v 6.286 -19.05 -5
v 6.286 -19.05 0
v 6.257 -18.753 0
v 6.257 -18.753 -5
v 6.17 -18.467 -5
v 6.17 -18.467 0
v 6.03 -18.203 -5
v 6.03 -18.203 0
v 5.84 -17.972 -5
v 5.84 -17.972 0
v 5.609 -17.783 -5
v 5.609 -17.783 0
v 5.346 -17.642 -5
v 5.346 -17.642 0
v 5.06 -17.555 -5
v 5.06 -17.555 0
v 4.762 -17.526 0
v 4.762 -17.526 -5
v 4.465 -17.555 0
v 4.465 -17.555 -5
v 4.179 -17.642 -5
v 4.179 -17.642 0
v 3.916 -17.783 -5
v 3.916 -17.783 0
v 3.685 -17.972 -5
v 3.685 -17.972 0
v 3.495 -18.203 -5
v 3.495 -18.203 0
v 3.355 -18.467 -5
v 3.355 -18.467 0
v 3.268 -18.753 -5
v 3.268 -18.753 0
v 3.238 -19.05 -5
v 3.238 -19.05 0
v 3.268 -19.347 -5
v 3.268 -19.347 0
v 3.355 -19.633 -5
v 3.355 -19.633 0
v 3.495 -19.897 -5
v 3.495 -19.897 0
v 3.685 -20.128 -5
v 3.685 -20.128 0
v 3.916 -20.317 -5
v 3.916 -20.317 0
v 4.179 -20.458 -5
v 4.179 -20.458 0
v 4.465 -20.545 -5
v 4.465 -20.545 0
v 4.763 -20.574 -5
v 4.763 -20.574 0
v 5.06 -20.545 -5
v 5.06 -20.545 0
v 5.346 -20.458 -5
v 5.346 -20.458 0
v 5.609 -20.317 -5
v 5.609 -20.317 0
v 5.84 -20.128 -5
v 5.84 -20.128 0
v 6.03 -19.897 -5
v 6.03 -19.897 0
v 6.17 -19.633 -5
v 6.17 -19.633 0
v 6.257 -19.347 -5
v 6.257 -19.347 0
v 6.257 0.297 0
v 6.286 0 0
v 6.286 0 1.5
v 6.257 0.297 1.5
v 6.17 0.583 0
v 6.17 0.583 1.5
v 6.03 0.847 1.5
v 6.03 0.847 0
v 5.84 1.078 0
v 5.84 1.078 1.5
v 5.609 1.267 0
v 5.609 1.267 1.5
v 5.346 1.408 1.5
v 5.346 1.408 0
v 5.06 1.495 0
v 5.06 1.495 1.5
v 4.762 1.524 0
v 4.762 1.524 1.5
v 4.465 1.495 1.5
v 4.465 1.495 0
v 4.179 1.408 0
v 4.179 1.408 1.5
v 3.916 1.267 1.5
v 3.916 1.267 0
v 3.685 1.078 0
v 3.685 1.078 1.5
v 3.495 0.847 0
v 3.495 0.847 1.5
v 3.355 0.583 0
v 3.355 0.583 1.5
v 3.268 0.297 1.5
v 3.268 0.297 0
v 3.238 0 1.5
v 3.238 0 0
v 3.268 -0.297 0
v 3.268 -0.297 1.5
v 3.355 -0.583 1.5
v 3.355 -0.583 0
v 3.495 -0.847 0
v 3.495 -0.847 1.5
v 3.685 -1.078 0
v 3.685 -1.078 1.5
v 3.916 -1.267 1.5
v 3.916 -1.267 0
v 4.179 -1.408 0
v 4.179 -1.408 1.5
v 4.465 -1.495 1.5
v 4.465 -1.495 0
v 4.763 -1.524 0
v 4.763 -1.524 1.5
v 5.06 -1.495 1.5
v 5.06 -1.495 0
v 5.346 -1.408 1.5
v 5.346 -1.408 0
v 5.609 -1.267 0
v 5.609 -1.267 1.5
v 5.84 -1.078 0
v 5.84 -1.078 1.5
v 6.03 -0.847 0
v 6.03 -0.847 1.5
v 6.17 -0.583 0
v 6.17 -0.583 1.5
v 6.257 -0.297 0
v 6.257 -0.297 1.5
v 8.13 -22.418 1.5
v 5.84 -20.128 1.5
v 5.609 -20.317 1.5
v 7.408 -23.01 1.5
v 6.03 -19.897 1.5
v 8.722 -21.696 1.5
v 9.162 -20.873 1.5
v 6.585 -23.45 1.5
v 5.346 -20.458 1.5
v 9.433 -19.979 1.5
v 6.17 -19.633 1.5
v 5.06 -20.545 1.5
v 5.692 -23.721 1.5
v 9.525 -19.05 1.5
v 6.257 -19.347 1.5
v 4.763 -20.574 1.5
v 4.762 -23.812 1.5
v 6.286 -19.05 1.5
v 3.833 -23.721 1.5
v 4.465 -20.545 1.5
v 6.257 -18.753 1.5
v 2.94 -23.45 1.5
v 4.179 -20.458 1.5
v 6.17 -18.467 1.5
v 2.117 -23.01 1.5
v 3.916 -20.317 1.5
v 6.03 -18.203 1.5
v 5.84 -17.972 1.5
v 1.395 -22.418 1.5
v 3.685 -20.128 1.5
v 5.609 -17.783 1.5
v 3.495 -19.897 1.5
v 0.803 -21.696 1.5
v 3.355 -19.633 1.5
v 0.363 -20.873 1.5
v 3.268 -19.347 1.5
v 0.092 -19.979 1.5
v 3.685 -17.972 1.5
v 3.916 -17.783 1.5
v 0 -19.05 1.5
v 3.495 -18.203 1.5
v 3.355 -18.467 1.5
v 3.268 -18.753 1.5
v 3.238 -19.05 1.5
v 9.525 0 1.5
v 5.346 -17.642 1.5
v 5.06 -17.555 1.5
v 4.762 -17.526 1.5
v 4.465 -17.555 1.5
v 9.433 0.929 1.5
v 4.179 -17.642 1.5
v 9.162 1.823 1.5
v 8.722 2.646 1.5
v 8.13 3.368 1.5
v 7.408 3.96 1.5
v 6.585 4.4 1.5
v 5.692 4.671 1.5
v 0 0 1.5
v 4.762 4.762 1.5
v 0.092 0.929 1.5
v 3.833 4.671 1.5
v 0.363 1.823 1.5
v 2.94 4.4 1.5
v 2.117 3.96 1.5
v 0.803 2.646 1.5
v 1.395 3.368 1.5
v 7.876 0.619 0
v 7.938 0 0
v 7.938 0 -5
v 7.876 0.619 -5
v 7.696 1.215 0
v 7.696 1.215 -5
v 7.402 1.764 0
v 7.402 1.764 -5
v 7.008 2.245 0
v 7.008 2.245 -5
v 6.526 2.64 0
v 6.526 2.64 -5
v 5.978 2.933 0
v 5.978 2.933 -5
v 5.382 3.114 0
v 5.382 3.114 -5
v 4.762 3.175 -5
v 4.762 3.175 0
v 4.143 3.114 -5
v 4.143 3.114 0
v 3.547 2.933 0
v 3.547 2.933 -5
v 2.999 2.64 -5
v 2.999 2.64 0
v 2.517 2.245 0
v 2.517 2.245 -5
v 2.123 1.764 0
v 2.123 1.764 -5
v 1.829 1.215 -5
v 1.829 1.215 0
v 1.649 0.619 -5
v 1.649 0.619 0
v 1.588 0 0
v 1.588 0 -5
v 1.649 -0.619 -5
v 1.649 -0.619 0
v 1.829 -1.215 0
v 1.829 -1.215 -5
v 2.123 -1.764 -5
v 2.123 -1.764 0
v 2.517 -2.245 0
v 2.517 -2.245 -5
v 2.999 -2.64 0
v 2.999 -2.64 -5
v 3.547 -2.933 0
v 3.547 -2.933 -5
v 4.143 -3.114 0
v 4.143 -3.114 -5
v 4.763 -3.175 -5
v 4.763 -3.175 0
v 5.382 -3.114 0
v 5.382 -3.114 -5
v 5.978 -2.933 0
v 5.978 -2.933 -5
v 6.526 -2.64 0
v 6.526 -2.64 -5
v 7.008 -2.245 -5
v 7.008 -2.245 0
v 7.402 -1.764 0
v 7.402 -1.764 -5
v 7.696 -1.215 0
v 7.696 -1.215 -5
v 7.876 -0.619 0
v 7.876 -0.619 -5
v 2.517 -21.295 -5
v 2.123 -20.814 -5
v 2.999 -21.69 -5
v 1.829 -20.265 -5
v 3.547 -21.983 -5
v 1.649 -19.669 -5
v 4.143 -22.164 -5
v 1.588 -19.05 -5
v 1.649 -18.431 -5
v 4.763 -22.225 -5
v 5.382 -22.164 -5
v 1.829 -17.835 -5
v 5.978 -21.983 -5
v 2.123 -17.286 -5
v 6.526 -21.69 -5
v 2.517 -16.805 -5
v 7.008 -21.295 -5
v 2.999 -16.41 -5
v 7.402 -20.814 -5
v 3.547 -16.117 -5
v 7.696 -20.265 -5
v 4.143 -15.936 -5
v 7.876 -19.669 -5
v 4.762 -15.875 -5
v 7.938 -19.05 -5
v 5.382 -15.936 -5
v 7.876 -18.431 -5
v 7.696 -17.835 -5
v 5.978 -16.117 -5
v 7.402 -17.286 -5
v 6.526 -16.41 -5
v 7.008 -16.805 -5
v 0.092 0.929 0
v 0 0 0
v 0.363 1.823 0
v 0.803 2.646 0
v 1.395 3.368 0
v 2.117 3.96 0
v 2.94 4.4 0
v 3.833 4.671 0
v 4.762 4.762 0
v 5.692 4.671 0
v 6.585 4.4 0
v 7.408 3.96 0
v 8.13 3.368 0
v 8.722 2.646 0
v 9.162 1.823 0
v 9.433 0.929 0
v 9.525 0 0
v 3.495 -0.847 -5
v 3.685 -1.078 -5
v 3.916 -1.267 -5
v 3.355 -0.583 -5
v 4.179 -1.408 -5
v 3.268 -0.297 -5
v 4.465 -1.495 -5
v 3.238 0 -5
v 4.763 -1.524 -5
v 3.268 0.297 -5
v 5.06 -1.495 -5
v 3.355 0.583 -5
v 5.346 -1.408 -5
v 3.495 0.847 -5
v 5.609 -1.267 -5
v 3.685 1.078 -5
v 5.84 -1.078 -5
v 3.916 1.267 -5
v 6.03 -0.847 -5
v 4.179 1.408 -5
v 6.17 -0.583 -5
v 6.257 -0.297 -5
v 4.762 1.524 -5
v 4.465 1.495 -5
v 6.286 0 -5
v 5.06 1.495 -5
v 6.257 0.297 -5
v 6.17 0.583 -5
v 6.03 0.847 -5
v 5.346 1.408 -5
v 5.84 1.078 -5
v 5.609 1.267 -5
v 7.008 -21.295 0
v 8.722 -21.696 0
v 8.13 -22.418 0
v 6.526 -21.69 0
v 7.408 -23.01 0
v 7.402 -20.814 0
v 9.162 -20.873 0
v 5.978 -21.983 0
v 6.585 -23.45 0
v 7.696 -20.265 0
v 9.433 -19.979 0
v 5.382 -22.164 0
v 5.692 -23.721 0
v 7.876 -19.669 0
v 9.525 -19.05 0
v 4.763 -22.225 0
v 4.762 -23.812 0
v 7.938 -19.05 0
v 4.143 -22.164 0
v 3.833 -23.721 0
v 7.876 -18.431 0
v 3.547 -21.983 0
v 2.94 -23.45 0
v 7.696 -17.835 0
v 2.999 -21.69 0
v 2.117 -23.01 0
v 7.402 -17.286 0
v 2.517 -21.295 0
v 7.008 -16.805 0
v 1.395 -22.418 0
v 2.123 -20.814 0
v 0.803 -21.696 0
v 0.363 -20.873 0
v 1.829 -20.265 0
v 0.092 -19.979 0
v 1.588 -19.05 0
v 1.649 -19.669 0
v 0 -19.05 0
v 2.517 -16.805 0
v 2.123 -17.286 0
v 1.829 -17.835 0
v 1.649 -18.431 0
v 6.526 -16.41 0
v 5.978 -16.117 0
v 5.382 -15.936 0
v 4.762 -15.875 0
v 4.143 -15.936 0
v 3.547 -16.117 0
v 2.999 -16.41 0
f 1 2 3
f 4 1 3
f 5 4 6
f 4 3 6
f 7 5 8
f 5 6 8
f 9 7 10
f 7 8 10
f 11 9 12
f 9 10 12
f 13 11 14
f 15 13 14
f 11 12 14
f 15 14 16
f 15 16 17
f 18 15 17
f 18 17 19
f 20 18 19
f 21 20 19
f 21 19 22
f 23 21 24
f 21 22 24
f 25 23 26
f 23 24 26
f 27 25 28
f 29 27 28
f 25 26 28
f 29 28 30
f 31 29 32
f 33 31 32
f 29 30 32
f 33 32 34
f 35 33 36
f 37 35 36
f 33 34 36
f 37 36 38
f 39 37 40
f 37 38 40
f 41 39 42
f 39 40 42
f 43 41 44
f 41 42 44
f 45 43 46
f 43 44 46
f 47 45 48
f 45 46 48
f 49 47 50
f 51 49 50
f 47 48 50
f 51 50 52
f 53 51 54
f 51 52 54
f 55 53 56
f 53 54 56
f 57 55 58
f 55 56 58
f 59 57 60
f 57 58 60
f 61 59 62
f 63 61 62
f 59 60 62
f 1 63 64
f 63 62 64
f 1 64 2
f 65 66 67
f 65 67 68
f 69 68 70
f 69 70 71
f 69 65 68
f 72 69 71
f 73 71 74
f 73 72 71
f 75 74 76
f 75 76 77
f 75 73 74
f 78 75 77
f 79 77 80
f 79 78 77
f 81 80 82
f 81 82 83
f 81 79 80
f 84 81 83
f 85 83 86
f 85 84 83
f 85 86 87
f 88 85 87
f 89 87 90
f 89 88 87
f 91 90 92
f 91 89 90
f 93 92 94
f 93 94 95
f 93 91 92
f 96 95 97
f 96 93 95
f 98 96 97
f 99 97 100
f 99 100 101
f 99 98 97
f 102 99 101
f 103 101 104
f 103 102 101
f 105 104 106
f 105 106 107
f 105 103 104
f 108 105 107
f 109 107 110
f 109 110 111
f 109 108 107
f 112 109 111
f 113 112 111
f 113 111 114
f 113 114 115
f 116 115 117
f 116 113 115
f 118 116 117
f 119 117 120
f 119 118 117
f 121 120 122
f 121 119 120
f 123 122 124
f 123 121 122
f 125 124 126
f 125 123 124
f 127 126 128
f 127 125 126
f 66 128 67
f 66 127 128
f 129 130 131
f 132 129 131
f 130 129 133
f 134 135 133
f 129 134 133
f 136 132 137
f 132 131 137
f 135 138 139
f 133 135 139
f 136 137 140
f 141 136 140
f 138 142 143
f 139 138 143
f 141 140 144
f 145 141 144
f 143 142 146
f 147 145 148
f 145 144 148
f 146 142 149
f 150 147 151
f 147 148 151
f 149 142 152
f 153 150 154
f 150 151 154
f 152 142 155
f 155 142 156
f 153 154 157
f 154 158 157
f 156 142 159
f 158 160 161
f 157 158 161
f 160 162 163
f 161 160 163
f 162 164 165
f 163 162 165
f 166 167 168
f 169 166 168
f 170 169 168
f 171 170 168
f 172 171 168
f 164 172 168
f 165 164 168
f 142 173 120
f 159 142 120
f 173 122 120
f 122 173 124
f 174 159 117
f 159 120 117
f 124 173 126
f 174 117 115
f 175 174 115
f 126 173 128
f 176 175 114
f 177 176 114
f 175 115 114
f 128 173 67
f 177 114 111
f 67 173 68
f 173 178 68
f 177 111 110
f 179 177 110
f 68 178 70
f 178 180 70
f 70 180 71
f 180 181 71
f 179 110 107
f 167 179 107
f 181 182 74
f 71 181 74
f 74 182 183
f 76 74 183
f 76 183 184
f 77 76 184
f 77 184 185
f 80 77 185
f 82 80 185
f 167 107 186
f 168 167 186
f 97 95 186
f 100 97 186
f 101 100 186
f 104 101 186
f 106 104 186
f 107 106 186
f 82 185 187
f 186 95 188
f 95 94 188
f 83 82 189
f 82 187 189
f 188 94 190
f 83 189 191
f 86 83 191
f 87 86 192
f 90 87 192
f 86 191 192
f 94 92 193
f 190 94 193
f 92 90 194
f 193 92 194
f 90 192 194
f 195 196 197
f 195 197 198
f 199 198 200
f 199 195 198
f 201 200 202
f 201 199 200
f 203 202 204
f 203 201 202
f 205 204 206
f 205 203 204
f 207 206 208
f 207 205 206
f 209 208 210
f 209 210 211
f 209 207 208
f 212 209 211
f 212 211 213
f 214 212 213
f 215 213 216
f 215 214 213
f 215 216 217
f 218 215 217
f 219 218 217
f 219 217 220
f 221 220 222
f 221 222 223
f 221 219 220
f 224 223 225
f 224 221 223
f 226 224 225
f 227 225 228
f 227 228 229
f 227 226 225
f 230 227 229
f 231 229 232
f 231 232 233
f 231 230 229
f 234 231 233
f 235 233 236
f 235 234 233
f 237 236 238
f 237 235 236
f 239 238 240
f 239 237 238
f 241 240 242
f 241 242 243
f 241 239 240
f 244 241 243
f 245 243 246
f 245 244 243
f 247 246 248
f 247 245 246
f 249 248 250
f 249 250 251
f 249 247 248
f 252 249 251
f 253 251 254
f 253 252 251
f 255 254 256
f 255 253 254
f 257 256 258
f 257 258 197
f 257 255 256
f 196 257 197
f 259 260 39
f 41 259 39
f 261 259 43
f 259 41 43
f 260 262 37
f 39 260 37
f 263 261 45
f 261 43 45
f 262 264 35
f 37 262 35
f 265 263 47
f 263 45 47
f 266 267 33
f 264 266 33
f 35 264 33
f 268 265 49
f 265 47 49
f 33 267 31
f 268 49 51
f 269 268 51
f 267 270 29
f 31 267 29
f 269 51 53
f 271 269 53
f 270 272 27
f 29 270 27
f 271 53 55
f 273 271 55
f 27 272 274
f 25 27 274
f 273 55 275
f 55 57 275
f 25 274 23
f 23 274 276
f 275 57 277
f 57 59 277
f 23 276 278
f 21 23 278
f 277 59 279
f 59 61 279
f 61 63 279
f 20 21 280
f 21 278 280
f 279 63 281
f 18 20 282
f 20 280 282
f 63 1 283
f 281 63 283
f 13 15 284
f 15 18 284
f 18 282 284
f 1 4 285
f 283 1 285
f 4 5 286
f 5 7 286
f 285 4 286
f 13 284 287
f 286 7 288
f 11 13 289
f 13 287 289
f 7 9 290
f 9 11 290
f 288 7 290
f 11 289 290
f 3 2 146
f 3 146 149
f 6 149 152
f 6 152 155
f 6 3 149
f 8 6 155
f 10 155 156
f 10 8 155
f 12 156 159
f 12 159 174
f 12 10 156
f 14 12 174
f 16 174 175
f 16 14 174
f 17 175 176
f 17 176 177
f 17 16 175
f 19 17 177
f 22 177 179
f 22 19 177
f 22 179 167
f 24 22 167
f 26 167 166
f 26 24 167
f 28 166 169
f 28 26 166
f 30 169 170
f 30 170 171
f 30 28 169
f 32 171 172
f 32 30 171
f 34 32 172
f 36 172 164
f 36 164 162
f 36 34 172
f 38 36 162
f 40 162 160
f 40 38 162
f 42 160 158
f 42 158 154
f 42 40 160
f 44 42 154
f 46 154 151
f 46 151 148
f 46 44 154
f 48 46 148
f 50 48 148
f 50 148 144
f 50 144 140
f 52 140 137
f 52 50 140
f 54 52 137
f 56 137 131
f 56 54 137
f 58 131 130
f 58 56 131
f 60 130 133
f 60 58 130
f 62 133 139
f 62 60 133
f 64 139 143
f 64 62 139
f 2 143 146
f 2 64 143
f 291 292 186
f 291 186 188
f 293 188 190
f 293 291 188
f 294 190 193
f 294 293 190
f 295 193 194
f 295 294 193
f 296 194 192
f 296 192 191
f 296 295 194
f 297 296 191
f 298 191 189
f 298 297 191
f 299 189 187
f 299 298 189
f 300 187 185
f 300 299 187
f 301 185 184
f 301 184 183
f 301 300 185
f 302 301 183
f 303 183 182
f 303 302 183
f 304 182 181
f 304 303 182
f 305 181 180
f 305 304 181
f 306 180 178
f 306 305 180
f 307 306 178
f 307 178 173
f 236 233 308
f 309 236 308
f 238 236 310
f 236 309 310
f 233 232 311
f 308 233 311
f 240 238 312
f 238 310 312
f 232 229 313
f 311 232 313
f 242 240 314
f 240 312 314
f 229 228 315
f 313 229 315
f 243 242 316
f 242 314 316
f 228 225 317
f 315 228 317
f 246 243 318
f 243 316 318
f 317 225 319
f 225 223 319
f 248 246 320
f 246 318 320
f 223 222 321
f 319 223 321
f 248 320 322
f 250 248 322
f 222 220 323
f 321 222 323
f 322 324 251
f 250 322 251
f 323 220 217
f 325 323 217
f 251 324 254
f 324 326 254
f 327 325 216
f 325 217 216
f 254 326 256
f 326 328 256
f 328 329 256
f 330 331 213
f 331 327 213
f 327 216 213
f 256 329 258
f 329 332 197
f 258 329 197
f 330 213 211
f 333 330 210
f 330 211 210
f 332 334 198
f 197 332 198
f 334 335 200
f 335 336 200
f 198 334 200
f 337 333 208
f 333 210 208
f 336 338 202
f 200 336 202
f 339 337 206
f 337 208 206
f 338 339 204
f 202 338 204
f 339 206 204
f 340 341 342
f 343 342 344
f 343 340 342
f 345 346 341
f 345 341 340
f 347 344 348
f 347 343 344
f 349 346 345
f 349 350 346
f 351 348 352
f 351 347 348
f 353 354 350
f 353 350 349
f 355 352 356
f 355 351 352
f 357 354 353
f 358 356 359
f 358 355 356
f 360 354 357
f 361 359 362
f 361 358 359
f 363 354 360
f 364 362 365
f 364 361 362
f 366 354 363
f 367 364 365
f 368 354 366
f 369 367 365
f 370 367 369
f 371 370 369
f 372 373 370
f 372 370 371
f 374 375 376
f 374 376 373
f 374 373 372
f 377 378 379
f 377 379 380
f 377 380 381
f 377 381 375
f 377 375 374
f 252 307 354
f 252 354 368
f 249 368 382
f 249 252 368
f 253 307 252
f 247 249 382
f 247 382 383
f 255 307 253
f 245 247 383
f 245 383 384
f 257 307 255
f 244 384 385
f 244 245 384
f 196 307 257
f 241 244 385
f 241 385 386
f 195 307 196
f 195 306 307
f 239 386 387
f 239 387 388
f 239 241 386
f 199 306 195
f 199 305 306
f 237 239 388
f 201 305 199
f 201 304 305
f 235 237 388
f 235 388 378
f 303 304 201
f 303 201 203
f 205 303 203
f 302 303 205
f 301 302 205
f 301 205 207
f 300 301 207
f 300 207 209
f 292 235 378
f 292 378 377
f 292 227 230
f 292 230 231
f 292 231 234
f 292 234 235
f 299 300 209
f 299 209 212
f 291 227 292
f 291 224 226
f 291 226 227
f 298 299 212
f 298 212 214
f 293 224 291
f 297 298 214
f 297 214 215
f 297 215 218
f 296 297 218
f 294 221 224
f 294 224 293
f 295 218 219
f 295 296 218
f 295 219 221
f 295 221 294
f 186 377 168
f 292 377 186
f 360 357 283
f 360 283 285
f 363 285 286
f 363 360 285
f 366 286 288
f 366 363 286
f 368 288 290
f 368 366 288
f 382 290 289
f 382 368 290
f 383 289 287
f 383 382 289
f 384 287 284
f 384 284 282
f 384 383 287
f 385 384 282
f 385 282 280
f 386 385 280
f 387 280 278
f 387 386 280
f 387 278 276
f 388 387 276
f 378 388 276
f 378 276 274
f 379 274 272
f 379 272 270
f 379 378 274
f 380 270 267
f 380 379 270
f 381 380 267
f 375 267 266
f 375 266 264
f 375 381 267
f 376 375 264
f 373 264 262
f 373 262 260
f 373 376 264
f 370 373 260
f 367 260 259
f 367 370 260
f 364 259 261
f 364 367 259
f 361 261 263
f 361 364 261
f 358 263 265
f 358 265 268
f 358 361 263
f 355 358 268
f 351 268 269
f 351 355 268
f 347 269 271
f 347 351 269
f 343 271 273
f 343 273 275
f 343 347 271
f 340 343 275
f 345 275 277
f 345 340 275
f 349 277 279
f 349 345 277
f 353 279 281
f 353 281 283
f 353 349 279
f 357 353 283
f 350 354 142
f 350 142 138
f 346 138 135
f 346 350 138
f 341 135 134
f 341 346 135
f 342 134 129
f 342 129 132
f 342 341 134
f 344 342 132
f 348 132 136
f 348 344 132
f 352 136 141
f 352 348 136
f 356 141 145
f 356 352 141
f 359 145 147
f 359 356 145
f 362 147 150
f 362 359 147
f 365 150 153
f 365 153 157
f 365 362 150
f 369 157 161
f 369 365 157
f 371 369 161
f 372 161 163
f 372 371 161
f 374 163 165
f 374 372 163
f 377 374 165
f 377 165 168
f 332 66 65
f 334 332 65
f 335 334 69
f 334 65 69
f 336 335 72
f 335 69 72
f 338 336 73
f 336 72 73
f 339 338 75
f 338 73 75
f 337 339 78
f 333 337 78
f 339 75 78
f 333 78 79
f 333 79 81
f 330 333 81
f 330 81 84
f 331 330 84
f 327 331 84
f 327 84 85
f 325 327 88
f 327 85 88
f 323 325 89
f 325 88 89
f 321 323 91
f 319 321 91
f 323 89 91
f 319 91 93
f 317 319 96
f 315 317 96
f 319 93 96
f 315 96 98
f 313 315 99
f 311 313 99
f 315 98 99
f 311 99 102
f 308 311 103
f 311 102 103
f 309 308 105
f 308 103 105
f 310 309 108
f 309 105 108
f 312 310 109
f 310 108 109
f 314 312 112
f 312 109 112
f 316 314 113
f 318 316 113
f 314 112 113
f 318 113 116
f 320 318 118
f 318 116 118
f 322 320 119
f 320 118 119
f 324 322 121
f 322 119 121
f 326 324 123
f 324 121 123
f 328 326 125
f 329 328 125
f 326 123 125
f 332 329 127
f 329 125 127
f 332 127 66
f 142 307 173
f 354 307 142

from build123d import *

# Parameters (mm, degrees)
SKETCH1_R           = 1.524
BOSS_EXTRUDE1_DEPTH = 1.5
BOSS_EXTRUDE2_START = -5
SKETCH1_7_R         = 3.175
SKETCH1_7_R_2       = 1.524
BOSS_EXTRUDE2_DEPTH = 5


with BuildPart() as part:
    # Sketch1 → Boss-Extrude1 (new body)
    with BuildSketch(Plane.XY):
        with BuildLine():
            Line((9.525, -19.05), (9.525, 0))
            ThreePointArc((9.525, 0), (4.7625, 4.7625), (0, 0))
            Line((0, 0), (0, -19.05))
            ThreePointArc((0, -19.05), (4.7625, -23.8125), (9.525, -19.05))
        make_face()
        with Locations((4.7625, -19.05)):
            Circle(SKETCH1_R, mode=Mode.SUBTRACT)
        with Locations((4.7625, 0)):
            Circle(SKETCH1_R, mode=Mode.SUBTRACT)
    extrude(amount=BOSS_EXTRUDE1_DEPTH)

    # Sketch1<7> → Boss-Extrude2 (add)
    # profile 1 of 2: a face of its own
    with BuildSketch(Plane.XY.offset(BOSS_EXTRUDE2_START)):
        with Locations((4.7625, 0)):
            Circle(SKETCH1_7_R)
        with Locations((4.7625, 0)):
            Circle(SKETCH1_7_R_2, mode=Mode.SUBTRACT)
    # profile 2 of 2: a face of its own
    with BuildSketch(Plane.XY.offset(BOSS_EXTRUDE2_START)):
        with Locations((4.7625, -19.05)):
            Circle(SKETCH1_7_R)
        with Locations((4.7625, -19.05)):
            Circle(SKETCH1_7_R_2, mode=Mode.SUBTRACT)
    extrude(amount=BOSS_EXTRUDE2_DEPTH)


solid = part.part
